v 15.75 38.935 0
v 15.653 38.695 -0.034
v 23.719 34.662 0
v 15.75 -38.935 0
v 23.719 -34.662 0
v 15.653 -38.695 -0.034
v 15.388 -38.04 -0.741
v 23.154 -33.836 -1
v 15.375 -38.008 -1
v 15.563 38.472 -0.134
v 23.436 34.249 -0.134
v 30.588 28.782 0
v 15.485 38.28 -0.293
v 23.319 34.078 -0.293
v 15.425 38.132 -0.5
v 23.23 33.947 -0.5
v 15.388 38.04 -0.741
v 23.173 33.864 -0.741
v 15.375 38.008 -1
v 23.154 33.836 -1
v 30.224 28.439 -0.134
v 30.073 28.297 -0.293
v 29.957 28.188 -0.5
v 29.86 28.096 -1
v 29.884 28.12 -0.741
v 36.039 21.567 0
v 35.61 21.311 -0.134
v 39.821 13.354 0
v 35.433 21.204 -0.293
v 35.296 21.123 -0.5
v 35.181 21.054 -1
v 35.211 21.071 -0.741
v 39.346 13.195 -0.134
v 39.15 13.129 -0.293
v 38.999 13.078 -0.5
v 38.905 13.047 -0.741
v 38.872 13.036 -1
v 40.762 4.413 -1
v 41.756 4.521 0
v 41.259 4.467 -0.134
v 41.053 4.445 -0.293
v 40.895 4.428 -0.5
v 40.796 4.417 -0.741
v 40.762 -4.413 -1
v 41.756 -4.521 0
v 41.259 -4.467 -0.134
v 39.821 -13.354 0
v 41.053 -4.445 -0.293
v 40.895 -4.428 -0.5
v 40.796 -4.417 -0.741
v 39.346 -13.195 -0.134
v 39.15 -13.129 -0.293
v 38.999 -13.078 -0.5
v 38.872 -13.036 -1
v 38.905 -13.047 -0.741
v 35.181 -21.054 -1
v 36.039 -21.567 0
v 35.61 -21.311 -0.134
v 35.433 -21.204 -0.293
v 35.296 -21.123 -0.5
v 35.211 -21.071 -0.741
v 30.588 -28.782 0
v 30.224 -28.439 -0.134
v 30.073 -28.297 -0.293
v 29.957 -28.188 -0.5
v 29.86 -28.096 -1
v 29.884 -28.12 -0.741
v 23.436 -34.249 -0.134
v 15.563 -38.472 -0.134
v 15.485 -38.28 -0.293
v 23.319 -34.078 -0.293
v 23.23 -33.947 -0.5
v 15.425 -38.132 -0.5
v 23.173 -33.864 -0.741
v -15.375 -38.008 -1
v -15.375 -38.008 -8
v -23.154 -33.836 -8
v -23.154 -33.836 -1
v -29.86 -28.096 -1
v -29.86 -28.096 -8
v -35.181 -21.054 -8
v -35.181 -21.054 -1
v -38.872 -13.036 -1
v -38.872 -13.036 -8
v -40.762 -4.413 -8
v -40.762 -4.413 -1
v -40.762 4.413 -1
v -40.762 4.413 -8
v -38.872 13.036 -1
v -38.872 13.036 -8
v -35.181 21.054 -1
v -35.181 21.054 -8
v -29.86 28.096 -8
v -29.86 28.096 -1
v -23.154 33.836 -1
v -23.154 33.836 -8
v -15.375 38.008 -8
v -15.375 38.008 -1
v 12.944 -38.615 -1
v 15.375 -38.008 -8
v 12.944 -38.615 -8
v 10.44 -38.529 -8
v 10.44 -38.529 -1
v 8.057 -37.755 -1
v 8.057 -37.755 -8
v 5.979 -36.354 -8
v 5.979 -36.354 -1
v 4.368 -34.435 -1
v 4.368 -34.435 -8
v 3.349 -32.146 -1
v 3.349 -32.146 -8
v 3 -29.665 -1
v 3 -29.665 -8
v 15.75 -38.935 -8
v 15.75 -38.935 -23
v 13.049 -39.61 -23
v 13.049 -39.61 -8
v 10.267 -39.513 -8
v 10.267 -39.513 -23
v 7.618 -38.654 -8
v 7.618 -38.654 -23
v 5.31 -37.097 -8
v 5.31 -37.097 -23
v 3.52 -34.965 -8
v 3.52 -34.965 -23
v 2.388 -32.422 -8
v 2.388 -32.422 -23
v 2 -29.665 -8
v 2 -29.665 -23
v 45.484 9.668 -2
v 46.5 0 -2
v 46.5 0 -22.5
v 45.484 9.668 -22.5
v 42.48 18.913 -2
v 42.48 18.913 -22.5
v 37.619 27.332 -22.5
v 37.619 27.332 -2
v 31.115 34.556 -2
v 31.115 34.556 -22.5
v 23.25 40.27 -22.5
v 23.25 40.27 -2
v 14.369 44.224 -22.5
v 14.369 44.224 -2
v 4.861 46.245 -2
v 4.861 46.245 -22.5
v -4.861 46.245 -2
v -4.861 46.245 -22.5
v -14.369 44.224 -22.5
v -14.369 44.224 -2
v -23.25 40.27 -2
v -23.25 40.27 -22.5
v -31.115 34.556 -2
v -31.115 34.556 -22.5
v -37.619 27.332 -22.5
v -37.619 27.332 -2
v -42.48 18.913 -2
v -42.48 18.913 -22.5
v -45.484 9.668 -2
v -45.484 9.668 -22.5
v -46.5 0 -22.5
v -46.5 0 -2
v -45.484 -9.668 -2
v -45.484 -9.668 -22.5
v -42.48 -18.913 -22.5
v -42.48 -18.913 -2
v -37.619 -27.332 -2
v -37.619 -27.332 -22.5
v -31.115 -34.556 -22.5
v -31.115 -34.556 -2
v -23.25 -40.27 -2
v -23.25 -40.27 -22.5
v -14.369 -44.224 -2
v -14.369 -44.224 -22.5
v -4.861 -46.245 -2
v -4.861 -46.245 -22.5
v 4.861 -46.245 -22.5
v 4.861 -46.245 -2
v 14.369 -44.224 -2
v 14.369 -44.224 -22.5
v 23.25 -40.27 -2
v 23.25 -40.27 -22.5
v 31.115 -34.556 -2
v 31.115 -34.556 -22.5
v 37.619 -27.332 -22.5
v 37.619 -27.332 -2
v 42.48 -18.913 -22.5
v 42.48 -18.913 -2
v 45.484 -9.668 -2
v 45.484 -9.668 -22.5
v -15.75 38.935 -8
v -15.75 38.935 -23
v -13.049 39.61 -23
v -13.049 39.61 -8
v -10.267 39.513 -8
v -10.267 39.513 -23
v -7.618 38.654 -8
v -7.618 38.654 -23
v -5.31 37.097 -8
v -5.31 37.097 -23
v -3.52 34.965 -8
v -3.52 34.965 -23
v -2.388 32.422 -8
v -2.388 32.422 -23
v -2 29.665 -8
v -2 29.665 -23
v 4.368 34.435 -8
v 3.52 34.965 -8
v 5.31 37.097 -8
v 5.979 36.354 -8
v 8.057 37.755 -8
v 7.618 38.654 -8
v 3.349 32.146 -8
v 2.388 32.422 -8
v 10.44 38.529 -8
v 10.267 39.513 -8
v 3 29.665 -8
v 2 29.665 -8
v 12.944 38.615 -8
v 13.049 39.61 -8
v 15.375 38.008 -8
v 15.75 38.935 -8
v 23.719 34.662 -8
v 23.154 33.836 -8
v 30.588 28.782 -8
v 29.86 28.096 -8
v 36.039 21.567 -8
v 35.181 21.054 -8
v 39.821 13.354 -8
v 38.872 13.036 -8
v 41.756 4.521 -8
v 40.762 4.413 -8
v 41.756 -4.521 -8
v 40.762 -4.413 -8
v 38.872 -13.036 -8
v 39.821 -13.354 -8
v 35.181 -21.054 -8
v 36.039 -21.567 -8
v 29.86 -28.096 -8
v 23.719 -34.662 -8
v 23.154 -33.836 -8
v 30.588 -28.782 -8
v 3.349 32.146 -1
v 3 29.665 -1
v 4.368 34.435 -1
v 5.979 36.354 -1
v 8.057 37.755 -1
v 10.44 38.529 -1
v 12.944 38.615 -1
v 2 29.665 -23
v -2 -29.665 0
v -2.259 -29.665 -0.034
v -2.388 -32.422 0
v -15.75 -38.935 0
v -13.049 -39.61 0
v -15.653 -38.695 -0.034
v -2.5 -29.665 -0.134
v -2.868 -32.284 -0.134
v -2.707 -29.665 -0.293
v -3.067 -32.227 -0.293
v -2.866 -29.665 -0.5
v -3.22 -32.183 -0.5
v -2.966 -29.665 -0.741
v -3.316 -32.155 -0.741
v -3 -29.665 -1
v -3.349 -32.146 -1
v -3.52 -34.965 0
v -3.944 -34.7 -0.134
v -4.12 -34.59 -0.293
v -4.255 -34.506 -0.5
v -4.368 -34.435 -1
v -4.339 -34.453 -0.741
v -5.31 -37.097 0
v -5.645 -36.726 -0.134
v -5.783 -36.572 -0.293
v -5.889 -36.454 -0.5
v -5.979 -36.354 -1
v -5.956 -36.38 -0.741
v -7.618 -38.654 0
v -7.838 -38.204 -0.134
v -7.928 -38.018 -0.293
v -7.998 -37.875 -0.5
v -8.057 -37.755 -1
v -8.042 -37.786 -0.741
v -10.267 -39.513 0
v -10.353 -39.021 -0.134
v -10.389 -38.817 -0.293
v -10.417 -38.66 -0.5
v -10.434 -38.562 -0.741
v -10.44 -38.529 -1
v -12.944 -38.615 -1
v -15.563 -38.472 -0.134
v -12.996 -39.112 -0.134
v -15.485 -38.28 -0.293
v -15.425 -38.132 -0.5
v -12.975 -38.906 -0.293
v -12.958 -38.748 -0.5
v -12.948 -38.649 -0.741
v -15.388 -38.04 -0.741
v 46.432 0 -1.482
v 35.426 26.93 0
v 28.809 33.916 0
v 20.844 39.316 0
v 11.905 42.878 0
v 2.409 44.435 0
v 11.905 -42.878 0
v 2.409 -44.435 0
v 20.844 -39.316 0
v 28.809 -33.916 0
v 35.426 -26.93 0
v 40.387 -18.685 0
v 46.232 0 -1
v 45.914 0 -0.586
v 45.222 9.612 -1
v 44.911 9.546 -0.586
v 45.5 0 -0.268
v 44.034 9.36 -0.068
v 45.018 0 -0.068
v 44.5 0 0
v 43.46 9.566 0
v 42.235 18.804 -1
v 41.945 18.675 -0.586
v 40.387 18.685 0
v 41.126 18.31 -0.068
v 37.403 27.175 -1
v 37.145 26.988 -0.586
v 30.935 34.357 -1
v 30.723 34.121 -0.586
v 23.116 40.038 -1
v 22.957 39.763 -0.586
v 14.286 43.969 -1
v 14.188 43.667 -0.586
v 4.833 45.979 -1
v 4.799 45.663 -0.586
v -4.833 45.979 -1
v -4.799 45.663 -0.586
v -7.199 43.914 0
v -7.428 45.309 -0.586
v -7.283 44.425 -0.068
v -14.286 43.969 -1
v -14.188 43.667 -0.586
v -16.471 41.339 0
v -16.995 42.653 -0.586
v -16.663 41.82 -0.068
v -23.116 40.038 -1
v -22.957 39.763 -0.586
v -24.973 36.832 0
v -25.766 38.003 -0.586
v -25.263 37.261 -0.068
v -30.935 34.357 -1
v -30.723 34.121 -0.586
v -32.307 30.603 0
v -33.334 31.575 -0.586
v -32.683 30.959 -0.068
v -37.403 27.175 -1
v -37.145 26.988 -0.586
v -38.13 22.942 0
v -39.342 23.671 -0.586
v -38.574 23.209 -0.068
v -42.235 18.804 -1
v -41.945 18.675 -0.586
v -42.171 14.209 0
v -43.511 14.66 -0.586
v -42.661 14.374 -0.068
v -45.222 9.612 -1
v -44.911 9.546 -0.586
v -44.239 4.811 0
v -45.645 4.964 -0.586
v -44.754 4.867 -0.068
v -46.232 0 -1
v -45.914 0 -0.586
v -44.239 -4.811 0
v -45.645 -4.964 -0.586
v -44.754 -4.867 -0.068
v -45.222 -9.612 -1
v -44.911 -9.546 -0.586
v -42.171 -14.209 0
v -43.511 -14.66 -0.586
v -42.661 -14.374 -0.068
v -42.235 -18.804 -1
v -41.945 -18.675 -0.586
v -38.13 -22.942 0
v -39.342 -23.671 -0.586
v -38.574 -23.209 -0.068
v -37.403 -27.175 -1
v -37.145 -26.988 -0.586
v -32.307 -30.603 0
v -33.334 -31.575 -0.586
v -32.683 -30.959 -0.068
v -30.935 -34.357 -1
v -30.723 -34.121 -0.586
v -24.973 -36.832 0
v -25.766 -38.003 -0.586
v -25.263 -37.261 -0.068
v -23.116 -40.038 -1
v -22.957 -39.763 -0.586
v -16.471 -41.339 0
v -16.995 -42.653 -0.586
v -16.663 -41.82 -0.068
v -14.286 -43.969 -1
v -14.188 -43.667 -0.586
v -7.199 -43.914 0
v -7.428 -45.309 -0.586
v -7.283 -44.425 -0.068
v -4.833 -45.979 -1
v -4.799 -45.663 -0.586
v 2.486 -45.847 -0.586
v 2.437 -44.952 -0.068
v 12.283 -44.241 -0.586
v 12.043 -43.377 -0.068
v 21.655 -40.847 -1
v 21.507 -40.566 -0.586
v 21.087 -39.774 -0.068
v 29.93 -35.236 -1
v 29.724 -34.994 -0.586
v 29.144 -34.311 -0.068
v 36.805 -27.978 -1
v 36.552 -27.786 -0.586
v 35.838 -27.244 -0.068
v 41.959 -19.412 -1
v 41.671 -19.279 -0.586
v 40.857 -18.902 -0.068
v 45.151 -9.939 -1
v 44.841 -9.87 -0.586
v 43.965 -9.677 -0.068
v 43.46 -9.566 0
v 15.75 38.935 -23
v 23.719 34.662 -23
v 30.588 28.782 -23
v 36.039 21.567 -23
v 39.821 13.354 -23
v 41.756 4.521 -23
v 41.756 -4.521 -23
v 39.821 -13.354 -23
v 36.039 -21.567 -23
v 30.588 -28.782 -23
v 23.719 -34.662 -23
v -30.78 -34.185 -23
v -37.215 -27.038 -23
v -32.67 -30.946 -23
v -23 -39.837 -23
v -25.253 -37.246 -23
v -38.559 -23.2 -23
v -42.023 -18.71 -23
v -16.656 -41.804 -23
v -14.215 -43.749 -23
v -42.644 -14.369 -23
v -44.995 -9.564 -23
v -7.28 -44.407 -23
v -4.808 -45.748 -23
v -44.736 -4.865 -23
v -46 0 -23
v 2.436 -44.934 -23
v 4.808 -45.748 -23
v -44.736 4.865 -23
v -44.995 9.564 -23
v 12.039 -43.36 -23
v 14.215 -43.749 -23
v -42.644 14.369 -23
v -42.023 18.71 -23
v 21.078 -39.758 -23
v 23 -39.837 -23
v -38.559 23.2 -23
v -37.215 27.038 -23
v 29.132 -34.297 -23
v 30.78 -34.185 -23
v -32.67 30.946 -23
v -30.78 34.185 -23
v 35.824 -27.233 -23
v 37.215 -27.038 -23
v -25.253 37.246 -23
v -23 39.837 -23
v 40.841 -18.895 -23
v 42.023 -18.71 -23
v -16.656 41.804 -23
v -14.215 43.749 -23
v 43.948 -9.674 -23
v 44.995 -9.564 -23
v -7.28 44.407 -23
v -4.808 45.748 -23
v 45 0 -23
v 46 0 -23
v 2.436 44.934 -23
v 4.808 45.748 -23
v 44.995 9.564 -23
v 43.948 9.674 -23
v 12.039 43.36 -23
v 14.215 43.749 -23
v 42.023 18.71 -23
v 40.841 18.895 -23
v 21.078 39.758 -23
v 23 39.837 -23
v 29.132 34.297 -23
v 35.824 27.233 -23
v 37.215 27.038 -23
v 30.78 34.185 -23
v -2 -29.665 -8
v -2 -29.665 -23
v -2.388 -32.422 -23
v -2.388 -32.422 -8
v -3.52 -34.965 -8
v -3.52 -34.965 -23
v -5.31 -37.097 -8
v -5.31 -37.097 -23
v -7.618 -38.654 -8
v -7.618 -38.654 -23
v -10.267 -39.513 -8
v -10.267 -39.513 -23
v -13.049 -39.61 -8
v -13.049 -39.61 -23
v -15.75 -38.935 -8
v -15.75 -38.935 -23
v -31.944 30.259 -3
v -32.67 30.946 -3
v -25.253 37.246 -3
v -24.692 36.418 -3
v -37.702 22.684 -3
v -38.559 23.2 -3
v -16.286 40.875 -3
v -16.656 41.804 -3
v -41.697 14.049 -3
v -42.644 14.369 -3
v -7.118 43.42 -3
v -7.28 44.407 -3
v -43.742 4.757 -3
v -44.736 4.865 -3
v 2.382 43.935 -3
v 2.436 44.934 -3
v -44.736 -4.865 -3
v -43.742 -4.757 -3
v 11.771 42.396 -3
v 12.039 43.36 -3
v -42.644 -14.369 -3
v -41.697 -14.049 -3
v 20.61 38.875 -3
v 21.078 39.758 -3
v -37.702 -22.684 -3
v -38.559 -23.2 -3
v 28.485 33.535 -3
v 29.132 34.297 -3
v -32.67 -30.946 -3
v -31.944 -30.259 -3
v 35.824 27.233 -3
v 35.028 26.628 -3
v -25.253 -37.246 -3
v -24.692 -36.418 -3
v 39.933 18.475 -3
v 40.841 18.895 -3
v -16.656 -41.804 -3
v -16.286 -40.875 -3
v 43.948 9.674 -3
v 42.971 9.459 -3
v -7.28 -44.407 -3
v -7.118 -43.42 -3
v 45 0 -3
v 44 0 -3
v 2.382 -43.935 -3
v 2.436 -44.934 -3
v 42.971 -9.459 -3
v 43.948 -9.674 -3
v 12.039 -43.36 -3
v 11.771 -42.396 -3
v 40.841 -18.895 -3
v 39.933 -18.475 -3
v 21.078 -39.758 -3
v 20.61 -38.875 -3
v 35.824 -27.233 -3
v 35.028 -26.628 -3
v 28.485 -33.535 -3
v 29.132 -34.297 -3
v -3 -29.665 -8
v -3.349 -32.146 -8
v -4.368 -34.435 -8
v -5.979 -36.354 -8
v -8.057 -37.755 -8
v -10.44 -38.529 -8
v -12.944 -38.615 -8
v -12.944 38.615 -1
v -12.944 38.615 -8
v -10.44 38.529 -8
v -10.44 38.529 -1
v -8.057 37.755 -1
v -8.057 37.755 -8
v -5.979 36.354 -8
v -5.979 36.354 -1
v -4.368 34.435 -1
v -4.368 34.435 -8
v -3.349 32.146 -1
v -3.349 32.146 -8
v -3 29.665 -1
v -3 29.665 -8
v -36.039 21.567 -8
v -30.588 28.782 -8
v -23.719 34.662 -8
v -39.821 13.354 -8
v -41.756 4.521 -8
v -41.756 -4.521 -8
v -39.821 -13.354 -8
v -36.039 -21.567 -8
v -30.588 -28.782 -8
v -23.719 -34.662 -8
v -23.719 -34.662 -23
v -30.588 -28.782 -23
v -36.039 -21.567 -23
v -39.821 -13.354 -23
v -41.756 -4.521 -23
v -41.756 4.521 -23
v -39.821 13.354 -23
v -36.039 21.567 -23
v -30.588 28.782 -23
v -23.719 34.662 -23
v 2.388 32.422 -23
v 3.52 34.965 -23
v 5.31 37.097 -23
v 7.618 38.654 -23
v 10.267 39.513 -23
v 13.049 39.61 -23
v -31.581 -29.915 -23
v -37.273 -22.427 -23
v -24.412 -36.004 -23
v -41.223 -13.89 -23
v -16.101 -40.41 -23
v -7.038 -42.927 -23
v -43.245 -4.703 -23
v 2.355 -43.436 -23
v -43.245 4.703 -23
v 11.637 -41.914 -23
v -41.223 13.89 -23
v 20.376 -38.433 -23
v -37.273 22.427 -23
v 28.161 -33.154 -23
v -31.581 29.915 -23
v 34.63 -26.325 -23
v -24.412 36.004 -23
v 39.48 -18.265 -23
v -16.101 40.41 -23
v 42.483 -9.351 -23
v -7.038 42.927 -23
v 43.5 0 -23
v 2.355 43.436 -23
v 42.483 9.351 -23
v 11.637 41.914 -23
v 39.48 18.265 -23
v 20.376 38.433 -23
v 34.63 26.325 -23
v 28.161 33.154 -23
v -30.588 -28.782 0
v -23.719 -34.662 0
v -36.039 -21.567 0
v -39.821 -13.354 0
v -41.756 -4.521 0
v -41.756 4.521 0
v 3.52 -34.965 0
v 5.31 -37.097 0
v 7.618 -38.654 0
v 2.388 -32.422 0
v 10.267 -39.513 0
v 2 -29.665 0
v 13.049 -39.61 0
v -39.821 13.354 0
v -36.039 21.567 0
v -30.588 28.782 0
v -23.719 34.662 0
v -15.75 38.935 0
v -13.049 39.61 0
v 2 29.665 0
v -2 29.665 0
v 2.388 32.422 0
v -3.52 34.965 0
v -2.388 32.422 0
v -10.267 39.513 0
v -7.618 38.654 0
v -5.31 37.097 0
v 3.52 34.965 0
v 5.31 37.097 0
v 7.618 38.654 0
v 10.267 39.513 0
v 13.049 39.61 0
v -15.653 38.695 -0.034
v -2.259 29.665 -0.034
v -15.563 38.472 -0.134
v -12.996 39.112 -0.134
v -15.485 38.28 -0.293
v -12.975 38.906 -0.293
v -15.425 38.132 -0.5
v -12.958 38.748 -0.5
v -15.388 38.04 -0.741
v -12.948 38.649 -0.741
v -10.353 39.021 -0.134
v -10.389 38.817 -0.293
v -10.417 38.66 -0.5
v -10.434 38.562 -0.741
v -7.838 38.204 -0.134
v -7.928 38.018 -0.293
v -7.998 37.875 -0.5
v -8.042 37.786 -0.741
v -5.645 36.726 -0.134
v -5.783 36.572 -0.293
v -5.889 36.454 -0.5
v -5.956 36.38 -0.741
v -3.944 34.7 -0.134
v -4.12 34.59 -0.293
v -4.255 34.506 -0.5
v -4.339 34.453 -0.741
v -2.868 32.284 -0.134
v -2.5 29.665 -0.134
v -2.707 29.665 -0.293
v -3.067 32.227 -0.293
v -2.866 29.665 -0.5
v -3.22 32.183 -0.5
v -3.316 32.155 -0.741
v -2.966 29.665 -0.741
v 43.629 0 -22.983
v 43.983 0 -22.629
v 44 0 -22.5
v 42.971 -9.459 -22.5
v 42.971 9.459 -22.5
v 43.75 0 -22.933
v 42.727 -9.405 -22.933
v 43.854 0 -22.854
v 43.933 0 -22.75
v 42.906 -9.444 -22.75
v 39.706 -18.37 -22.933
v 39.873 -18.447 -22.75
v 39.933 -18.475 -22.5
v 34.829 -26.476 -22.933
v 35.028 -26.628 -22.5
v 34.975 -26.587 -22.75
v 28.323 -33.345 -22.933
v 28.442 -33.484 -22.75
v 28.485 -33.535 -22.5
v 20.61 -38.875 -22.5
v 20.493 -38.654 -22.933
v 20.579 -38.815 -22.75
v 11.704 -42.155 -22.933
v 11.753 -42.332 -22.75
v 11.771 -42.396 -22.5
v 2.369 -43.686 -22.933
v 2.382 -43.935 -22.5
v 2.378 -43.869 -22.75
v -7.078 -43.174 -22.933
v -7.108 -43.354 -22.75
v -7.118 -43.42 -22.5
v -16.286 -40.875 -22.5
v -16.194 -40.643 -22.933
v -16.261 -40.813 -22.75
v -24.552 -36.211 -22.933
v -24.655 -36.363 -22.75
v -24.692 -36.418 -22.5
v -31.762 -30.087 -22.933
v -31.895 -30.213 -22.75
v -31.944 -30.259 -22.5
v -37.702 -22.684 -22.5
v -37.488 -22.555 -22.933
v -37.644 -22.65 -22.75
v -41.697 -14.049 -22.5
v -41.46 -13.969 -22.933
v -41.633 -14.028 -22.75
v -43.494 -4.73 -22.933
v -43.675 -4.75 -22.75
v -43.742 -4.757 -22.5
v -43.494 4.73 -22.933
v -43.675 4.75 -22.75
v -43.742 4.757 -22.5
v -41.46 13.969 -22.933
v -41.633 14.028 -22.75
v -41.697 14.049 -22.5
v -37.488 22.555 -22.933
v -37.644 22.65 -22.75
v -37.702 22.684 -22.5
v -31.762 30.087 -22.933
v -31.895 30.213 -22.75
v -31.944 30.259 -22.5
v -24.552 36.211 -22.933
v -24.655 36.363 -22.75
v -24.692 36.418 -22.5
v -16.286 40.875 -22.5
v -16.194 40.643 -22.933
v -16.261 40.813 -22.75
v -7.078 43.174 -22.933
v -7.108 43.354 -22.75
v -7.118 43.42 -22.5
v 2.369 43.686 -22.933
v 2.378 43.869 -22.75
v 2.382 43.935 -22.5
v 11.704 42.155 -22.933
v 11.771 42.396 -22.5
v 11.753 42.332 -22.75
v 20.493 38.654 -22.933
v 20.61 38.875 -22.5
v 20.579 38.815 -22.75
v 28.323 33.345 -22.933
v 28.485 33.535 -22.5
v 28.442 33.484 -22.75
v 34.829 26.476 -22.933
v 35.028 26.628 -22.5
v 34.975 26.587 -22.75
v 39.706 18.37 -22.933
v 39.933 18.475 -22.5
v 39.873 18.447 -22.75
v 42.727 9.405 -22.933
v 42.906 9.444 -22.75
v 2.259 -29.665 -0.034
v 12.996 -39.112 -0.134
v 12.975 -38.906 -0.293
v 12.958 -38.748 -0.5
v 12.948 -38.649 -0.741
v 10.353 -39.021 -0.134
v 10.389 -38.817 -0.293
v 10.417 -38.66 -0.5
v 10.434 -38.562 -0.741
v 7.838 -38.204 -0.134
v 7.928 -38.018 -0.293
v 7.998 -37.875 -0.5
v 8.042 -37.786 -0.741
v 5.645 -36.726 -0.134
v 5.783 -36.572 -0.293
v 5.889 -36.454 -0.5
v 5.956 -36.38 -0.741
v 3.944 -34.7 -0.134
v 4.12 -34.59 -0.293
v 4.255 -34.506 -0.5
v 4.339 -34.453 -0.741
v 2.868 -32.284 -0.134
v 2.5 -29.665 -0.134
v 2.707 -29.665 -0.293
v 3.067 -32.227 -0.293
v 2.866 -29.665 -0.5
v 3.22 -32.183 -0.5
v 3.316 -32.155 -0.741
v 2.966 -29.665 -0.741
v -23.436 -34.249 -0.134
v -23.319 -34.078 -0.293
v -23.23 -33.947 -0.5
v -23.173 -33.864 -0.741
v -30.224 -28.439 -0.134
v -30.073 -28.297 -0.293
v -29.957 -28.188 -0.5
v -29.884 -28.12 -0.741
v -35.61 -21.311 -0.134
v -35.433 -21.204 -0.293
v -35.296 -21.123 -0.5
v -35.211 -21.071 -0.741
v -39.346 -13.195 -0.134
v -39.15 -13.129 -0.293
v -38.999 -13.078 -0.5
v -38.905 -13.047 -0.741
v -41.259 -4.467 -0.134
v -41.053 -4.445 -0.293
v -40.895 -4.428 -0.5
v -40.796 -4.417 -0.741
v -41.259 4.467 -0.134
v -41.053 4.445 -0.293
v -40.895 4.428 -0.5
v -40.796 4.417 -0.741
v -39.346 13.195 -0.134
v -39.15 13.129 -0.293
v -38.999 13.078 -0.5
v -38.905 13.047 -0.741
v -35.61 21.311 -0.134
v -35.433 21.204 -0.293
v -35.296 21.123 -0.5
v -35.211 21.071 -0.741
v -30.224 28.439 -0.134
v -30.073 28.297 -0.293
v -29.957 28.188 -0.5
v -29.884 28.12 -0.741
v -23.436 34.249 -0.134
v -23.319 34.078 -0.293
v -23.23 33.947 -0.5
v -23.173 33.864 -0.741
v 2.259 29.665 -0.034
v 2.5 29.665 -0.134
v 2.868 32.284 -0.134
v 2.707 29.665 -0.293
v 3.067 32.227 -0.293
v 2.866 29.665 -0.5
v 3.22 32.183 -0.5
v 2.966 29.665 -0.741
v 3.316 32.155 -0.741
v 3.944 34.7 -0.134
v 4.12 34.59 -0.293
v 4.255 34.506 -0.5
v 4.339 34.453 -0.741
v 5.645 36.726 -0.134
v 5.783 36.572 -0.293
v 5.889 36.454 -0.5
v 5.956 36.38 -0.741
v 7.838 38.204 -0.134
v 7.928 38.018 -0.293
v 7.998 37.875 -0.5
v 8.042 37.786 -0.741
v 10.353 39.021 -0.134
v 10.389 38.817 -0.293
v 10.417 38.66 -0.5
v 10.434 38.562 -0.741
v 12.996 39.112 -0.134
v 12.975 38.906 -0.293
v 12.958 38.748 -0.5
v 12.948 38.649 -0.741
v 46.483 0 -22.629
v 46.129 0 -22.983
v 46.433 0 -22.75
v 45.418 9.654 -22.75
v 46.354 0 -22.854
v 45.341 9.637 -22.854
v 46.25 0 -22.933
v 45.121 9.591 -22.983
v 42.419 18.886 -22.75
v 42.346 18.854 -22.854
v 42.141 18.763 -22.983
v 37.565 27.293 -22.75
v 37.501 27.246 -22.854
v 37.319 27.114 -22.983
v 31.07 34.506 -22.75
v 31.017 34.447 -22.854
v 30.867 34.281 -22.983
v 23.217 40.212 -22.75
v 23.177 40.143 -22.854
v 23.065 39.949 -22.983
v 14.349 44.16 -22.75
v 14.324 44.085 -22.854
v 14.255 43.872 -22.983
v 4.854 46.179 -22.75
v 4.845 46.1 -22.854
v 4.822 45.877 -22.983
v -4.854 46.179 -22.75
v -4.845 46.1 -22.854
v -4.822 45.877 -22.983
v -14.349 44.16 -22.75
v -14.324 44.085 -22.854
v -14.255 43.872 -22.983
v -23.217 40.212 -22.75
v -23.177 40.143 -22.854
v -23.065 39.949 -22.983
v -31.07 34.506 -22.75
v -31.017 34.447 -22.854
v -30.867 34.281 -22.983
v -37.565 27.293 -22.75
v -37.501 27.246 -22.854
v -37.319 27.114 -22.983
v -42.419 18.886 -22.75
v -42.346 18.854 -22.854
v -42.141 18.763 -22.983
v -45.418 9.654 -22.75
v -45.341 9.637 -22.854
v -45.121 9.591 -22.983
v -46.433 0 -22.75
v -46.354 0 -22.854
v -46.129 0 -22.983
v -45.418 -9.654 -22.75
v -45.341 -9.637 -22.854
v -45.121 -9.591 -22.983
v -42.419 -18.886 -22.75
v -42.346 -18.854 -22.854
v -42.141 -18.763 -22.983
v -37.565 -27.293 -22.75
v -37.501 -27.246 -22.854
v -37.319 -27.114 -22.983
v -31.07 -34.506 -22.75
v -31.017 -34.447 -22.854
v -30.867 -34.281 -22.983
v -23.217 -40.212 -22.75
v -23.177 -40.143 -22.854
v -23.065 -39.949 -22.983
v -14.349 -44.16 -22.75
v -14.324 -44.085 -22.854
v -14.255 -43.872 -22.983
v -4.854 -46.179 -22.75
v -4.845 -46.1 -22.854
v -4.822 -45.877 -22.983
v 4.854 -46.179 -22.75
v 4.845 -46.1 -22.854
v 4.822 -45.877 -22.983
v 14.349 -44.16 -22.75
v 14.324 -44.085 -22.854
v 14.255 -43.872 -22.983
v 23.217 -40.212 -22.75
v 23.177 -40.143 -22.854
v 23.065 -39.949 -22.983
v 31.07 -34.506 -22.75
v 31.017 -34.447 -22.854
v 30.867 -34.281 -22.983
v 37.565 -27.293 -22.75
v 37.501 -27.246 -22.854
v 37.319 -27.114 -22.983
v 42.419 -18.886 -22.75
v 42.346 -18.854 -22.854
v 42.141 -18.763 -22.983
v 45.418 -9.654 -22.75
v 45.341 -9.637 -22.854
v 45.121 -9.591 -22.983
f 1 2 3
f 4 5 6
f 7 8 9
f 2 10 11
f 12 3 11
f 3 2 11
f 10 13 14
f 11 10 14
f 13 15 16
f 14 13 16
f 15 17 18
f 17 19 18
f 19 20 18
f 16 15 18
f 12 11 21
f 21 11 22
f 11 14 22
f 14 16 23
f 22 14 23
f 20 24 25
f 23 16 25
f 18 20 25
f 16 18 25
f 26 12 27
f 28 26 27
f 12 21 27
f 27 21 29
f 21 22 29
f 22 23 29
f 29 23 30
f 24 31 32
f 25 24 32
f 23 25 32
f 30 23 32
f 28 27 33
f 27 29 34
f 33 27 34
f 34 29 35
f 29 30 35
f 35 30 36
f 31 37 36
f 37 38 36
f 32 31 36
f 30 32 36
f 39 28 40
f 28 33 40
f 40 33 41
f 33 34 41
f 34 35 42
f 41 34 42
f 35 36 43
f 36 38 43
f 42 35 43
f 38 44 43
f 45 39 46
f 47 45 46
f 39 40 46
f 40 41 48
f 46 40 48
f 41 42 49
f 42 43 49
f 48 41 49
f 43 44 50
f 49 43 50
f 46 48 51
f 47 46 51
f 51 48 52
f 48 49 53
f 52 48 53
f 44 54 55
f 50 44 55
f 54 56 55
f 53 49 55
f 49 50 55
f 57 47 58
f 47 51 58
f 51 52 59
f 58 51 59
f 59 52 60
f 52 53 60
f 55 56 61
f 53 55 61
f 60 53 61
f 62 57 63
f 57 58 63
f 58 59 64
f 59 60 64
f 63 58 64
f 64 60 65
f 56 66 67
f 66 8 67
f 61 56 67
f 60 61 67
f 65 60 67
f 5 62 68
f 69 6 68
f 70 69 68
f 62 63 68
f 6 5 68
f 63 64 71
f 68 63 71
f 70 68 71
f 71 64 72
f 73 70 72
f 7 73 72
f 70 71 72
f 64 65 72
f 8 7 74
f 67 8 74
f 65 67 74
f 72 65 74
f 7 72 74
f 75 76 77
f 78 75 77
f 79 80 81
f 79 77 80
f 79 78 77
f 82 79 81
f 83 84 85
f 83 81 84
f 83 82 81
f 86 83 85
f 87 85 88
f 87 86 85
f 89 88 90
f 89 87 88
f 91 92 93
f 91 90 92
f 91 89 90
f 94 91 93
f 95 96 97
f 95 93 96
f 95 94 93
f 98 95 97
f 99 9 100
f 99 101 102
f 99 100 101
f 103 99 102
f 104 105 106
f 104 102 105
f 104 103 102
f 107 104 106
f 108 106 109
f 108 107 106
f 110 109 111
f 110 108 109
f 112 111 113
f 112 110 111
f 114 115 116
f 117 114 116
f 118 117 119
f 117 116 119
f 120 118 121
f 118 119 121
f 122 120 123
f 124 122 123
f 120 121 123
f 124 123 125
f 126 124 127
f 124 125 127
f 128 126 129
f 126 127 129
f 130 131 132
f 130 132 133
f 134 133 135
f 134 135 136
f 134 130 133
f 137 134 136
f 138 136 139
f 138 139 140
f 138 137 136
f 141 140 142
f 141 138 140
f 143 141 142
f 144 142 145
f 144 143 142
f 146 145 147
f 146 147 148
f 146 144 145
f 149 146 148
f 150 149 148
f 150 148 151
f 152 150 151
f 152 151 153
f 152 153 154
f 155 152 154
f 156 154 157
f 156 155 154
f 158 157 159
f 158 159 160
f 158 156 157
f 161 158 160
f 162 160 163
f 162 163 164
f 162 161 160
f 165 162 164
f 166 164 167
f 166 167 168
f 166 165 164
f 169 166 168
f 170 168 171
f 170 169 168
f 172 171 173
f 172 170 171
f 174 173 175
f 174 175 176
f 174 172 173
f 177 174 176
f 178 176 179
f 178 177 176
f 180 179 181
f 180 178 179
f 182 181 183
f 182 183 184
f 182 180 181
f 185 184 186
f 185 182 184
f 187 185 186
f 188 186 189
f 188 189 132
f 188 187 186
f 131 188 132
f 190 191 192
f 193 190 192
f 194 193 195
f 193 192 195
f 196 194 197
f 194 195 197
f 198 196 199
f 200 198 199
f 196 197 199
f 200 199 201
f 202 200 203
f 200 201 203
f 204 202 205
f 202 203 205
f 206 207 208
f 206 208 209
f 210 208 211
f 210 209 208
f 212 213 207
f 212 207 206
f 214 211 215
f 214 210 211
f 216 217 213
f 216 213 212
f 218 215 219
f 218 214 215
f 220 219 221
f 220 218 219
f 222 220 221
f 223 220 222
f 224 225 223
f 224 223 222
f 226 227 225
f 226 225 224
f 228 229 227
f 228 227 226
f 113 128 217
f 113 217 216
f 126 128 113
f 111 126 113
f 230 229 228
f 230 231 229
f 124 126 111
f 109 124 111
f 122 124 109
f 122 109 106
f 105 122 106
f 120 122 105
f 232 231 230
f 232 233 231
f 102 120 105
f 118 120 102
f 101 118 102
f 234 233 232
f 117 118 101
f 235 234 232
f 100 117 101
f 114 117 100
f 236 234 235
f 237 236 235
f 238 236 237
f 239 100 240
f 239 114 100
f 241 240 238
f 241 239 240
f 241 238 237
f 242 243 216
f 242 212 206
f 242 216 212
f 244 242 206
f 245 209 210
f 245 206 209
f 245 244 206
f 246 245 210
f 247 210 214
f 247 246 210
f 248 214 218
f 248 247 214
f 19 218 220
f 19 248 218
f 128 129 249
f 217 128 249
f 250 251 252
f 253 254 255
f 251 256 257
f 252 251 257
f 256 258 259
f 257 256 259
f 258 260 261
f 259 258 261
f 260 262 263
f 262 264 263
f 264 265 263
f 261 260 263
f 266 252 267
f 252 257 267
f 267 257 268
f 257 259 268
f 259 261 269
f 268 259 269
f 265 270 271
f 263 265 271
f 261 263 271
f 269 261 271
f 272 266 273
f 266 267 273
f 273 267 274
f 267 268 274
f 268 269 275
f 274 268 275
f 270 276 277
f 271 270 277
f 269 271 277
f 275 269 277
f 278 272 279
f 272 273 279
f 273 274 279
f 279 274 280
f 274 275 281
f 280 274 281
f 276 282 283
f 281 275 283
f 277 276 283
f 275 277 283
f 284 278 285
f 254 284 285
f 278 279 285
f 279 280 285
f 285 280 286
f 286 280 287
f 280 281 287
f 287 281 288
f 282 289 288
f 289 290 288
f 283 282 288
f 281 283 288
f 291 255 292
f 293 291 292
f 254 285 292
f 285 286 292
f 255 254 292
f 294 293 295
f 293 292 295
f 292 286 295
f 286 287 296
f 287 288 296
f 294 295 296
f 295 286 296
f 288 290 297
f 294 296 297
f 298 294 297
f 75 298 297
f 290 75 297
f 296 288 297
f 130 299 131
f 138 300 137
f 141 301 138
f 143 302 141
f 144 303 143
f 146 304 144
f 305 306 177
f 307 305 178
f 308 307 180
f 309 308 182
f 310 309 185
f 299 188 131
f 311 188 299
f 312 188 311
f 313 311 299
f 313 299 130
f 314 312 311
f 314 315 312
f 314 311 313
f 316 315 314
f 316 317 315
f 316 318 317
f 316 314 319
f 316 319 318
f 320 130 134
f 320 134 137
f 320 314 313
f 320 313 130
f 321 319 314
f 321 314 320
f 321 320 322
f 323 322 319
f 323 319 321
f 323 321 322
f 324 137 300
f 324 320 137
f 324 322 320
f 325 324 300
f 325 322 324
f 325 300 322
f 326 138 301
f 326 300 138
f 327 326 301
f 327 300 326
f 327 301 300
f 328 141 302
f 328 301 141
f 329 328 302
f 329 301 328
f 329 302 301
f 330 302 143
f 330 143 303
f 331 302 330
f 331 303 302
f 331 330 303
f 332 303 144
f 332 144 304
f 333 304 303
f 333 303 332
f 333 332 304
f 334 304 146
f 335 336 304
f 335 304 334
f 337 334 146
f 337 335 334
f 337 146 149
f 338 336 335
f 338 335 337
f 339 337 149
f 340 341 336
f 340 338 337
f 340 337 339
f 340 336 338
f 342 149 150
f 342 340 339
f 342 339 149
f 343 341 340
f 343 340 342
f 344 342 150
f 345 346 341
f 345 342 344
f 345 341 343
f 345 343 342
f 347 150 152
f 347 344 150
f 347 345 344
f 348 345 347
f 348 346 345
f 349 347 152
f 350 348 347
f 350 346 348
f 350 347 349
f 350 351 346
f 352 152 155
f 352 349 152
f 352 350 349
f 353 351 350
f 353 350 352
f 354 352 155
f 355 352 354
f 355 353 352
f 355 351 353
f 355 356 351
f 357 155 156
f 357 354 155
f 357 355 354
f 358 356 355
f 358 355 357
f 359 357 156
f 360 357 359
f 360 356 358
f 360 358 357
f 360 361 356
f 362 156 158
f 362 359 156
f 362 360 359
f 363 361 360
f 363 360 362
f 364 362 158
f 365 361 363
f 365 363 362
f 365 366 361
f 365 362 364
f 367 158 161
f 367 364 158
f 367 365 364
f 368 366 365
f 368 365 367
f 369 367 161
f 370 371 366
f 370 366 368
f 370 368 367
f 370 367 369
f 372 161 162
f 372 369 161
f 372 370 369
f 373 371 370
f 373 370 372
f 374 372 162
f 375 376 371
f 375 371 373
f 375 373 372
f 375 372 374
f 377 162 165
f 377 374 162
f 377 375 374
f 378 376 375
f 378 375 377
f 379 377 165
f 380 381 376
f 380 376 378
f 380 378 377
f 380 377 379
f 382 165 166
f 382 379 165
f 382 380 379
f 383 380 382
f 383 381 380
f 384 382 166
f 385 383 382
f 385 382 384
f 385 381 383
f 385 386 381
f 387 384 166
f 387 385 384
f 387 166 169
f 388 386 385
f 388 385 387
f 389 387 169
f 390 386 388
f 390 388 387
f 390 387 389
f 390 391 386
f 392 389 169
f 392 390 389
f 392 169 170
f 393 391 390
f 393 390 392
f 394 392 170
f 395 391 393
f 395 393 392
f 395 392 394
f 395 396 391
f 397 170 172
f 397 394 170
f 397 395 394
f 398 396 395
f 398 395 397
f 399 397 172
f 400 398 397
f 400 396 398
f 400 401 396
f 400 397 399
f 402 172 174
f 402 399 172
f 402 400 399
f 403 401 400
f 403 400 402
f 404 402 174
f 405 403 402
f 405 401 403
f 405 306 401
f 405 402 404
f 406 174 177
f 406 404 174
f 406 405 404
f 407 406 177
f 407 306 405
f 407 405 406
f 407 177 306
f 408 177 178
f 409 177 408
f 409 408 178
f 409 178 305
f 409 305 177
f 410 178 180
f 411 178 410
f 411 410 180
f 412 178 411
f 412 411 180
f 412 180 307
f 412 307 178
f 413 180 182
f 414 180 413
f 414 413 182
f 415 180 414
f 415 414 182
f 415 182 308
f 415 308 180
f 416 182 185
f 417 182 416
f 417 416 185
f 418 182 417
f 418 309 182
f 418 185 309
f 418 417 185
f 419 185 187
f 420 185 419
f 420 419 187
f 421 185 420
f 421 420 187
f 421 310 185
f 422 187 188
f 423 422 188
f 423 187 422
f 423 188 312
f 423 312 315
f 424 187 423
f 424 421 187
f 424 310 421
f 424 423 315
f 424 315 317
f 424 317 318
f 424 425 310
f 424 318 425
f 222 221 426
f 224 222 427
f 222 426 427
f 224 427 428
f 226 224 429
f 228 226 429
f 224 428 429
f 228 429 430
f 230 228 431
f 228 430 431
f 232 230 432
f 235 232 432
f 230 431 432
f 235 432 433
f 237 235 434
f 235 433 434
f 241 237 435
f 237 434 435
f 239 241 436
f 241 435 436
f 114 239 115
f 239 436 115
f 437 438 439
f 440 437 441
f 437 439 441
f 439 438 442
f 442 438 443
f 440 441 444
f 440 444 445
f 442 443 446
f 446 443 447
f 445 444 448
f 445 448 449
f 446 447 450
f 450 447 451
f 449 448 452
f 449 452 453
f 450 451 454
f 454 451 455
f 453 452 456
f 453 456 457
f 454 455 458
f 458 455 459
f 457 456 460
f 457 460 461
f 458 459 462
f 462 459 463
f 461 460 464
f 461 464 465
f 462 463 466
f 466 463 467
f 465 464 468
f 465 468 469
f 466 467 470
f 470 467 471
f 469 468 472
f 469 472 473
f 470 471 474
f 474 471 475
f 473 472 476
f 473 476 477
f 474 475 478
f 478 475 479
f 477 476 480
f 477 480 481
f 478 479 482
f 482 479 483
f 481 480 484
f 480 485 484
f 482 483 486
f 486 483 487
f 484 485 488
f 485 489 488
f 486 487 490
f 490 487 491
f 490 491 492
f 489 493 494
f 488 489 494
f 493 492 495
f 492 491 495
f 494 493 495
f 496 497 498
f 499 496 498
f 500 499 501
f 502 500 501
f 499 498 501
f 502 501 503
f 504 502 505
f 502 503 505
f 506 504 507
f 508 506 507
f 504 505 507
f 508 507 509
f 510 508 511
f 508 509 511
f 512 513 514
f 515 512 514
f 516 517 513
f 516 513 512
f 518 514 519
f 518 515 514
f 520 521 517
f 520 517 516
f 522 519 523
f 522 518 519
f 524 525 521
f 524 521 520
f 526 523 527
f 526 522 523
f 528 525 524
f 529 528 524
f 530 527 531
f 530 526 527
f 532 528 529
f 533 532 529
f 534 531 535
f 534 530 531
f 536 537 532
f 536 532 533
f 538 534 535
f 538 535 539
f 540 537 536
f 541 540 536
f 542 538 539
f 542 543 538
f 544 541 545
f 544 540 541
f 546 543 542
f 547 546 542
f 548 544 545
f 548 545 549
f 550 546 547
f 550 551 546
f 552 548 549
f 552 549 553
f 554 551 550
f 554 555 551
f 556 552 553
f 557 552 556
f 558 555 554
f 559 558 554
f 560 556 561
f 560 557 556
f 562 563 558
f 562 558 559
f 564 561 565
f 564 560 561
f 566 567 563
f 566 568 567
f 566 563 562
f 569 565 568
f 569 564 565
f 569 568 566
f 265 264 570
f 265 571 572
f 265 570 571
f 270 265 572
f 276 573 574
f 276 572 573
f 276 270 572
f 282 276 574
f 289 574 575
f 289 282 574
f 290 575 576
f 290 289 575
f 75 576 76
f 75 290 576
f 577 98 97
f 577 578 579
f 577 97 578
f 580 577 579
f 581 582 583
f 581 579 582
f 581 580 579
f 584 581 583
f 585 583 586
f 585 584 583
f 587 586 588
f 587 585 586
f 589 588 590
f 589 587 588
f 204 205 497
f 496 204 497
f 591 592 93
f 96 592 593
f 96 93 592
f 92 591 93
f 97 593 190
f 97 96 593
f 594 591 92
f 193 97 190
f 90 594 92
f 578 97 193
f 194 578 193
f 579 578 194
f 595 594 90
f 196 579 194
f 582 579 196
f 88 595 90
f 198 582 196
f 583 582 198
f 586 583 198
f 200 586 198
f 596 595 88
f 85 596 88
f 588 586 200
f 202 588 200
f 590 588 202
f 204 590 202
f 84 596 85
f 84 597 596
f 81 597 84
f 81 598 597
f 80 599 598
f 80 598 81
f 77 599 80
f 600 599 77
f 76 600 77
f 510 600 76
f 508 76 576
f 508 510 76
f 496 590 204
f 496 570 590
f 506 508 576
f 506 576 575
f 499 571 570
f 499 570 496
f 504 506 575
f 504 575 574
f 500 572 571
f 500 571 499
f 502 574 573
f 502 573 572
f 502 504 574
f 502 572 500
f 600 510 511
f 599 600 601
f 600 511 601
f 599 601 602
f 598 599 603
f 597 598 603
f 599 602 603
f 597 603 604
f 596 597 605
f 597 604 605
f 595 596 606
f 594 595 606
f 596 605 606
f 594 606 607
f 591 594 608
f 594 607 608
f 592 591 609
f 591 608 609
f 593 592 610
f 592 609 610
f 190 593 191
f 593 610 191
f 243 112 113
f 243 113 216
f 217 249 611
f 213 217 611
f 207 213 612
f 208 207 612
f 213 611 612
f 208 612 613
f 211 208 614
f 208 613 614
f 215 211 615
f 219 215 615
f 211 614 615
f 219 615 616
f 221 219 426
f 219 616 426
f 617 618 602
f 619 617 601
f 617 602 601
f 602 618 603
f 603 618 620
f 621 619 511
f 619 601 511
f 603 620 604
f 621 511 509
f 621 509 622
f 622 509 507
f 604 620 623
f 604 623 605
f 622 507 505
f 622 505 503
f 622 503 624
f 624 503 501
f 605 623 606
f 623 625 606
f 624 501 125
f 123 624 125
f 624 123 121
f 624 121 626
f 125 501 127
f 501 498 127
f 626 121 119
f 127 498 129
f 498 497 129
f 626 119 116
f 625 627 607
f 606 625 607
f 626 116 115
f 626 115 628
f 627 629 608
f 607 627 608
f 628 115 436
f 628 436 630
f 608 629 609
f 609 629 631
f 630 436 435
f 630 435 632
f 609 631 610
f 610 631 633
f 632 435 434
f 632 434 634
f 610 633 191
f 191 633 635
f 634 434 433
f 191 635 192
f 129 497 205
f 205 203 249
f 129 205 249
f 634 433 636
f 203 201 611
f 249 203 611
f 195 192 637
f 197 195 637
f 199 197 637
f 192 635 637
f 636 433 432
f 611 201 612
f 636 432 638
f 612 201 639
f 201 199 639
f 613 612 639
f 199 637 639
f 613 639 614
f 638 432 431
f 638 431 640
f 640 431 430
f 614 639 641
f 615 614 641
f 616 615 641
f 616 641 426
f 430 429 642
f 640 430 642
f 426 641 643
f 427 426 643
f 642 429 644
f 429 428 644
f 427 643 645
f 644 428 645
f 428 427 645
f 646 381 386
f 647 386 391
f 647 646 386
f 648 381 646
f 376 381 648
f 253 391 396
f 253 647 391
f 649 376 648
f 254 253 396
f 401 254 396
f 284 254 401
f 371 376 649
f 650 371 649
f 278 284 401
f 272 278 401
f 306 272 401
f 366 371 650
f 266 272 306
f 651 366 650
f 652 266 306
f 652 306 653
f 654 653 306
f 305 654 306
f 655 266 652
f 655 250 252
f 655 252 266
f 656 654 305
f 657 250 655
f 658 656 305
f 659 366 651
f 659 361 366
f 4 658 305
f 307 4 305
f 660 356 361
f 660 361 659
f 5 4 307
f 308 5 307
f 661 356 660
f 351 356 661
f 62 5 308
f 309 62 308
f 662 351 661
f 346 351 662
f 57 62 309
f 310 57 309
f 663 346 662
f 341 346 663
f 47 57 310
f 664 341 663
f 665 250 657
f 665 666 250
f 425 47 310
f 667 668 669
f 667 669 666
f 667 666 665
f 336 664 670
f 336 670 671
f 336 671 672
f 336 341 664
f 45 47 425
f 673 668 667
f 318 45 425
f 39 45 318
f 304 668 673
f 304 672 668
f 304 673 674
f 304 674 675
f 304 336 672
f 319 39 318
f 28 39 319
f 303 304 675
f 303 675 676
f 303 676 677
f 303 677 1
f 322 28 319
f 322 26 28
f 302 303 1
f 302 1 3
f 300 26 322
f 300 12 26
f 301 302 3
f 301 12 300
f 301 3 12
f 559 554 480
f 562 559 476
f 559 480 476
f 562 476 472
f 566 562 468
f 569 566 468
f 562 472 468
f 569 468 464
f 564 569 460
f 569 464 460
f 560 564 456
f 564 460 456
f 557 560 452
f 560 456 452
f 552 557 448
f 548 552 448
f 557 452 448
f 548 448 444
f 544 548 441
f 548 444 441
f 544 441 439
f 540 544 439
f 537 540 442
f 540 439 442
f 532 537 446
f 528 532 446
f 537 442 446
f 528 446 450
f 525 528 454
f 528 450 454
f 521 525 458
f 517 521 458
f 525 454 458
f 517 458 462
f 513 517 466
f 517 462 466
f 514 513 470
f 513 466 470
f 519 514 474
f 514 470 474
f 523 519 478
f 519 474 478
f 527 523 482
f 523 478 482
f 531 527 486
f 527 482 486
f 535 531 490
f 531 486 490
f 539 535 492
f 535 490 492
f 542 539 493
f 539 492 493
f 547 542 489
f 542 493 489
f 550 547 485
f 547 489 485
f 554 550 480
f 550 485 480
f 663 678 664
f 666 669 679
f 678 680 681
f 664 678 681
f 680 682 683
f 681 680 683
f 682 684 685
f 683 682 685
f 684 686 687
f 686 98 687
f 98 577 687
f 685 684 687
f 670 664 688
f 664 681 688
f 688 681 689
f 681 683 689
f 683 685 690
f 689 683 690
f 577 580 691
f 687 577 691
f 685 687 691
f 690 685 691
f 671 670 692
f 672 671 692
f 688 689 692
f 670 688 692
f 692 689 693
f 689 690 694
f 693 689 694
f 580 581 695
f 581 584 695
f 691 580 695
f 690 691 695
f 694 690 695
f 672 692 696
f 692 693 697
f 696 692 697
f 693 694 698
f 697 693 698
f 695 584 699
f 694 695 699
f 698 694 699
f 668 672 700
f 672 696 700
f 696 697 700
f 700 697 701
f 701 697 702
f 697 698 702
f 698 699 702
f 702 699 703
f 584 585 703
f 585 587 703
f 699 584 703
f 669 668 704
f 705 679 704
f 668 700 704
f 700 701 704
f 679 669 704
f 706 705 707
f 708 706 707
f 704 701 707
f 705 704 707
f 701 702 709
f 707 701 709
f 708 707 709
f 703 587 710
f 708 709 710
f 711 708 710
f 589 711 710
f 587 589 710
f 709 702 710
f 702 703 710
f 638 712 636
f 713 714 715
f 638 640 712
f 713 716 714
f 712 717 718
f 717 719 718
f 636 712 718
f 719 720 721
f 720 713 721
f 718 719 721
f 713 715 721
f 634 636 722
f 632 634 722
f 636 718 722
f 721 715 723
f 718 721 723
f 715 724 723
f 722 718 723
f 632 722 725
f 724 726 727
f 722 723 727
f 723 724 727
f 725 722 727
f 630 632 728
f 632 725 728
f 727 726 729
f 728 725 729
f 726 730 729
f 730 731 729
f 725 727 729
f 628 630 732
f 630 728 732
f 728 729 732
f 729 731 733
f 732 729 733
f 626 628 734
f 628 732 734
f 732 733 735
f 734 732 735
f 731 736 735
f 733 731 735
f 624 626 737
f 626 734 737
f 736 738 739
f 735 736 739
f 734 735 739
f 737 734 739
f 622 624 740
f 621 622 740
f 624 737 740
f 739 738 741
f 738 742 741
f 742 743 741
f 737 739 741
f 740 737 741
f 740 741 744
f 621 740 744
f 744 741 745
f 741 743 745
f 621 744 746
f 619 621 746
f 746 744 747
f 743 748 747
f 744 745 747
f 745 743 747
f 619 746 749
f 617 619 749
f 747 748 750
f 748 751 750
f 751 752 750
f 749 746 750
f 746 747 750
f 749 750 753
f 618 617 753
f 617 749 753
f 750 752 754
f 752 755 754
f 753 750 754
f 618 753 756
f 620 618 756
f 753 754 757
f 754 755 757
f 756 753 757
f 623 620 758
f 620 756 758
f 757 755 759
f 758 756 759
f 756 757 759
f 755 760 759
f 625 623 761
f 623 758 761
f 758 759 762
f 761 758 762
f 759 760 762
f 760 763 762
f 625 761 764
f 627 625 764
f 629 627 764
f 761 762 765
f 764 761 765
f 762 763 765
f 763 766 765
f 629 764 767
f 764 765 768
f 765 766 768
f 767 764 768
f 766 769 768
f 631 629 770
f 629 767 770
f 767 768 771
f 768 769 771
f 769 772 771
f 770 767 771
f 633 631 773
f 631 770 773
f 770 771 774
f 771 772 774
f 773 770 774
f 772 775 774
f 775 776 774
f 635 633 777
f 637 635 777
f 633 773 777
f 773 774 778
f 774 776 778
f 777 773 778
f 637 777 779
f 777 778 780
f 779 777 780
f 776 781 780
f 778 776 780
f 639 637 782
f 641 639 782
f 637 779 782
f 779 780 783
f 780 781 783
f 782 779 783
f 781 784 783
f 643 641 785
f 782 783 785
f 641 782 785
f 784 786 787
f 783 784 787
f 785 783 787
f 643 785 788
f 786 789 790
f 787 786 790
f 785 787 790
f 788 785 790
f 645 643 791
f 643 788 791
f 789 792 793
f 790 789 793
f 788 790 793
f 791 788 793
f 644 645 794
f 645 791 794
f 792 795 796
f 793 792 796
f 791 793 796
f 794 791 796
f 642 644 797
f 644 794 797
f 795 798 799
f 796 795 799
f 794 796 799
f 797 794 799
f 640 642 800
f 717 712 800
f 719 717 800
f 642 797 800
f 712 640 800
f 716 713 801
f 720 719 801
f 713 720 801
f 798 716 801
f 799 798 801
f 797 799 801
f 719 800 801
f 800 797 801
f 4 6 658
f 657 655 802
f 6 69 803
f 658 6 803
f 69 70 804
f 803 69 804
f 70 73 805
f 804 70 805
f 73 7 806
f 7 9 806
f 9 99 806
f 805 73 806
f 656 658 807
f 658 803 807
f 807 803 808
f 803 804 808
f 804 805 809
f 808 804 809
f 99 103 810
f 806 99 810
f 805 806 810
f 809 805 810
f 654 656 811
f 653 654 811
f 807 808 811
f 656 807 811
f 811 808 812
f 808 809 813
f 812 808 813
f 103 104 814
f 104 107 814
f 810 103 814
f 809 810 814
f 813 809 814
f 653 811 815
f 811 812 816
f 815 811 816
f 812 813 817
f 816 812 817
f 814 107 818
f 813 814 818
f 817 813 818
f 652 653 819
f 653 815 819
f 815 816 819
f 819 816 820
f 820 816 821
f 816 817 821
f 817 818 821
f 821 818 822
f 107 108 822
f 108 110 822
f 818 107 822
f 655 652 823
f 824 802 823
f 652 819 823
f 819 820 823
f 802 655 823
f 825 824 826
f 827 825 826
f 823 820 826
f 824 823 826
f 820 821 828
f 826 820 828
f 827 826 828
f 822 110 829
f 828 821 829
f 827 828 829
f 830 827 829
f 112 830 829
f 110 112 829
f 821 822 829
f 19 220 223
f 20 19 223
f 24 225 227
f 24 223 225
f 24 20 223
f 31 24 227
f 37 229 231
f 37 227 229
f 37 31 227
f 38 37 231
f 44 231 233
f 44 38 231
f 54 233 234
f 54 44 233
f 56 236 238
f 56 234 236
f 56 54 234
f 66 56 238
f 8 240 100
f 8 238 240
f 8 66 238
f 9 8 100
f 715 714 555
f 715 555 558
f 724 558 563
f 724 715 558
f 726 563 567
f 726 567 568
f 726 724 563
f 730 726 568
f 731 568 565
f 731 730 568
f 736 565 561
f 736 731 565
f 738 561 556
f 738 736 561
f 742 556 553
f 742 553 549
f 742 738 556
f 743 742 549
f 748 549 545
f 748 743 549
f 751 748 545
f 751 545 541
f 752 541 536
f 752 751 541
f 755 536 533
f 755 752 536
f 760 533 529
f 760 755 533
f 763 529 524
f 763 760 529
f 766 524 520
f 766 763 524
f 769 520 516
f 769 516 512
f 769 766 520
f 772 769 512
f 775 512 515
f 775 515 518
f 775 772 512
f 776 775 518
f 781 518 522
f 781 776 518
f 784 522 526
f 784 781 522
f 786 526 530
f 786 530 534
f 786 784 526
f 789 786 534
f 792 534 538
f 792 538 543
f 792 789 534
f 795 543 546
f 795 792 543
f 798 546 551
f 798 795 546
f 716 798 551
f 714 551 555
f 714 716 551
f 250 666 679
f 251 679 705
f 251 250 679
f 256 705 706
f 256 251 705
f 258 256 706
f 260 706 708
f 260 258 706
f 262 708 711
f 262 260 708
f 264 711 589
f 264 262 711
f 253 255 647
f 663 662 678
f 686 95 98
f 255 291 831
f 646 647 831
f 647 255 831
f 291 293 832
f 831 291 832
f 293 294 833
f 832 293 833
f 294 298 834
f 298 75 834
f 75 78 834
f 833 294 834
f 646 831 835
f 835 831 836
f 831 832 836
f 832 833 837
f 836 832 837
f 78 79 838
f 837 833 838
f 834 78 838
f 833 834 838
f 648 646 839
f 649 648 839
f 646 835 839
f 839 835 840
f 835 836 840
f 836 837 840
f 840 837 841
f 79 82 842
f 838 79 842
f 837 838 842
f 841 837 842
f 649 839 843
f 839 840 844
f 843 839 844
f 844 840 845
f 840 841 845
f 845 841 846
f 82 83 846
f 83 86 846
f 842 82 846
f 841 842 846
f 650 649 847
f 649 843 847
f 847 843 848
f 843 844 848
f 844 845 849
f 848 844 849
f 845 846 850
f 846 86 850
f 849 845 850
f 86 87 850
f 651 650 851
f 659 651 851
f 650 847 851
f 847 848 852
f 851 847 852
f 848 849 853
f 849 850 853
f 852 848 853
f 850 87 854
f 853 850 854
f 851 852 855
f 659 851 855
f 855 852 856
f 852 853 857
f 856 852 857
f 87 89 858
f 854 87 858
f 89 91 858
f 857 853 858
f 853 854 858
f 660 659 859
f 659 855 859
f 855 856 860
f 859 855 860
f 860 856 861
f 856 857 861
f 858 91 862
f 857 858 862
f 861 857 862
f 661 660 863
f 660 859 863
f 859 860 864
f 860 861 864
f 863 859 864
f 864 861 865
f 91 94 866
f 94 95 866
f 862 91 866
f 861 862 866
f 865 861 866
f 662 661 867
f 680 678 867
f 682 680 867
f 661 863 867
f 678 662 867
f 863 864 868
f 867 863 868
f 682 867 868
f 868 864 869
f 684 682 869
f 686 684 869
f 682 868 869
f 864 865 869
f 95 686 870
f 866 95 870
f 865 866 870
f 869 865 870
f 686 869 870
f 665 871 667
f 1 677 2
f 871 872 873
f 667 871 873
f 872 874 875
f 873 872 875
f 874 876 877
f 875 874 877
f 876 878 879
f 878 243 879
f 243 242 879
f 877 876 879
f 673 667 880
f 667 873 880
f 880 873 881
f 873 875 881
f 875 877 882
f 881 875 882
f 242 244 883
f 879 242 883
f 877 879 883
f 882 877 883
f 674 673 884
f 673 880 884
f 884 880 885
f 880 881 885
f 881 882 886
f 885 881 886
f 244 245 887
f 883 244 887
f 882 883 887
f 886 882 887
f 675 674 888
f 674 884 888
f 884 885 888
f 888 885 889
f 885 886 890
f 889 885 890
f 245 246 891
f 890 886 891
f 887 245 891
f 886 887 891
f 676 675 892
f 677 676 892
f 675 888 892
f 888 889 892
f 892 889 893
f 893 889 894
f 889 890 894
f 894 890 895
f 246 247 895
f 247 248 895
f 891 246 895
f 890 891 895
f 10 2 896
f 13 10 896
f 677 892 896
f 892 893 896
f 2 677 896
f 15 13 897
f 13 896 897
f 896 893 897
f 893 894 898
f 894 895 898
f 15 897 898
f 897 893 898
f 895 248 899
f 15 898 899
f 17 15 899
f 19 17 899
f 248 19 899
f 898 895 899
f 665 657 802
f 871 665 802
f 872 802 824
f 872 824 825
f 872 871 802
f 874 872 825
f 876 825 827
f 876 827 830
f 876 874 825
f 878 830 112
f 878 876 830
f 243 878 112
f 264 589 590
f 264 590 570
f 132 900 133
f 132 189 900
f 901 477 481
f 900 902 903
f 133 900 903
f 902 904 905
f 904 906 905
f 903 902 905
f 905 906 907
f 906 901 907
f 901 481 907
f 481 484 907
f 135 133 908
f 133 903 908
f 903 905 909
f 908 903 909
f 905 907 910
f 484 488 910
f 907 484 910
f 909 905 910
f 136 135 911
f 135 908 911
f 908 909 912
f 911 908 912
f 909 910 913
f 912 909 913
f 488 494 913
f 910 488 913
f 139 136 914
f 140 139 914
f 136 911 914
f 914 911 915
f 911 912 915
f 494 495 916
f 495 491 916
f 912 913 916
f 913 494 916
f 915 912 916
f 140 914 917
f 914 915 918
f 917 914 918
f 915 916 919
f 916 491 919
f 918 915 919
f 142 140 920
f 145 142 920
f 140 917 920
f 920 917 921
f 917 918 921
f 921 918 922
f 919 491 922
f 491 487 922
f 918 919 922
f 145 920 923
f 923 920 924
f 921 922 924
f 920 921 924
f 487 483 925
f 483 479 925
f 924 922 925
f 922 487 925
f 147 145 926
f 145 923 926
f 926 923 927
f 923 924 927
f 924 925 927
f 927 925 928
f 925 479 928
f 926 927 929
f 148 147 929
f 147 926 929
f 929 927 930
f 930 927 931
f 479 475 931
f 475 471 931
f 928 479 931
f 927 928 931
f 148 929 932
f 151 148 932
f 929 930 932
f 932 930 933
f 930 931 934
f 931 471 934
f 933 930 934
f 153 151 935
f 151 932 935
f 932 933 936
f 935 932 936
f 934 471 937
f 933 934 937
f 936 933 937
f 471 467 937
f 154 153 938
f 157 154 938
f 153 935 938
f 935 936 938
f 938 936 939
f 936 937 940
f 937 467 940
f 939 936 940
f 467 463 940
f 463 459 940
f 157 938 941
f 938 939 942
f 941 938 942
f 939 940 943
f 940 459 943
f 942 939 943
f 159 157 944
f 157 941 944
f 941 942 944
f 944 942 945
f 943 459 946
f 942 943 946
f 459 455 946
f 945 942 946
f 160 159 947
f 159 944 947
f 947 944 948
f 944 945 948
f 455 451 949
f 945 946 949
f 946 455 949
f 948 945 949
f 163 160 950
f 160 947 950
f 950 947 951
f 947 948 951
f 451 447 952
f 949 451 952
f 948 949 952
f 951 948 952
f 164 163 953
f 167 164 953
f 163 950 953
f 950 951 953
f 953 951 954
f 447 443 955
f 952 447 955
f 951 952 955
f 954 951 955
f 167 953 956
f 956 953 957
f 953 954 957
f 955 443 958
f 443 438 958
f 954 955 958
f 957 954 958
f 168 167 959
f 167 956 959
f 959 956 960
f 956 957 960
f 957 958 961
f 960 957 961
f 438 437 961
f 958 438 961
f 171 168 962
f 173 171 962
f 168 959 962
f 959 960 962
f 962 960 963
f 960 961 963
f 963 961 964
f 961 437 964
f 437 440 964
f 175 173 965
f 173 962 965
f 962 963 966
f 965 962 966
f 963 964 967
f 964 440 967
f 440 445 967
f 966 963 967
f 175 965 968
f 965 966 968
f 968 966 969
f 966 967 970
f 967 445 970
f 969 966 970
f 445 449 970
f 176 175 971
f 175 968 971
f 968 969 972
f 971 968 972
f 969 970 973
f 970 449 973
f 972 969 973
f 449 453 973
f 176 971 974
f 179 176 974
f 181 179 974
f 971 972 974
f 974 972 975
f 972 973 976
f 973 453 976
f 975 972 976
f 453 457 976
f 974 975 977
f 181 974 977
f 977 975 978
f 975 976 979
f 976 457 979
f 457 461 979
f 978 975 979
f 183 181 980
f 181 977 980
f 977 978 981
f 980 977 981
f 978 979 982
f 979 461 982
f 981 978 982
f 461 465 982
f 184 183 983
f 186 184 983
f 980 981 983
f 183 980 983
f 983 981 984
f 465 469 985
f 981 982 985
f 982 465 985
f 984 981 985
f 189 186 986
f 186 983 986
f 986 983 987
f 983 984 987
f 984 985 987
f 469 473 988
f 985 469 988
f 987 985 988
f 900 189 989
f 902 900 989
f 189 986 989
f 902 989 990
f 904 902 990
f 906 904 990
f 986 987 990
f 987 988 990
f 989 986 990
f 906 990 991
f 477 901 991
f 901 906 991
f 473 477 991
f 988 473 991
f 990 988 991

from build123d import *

# Parameters (mm, degrees)
F0_R     = 46.5
F1_DEPTH = 23
F3_DEPTH = 15
F4_R     = 1
F5_R     = 45
F5_R_2   = 44
F6_DEPTH = 20
F7_R     = 0.5
F8_R     = 2


# Not quite as in the source:
# - a feature names something its author has since deleted; it is built from what else it names


with BuildPart() as f1:
    # F0 (on Top) → F1 (new body)
    with BuildSketch(Plane.XY):
        Circle(F0_R)
        with BuildLine():
            ThreePointArc((-15.375, -38.0080172464), (-41, 0), (-15.375, 38.0080172464))
            ThreePointArc((-15.375, 38.0080172464), (-6.9688470506, 37.1271997267), (-3, 29.6647939484))
            Line((-3, 29.6647939484), (-3, -29.6647939484))
            ThreePointArc((-3, -29.6647939484), (-6.9688470506, -37.1271997267), (-15.375, -38.0080172464))
        make_face(mode=Mode.SUBTRACT)
        with BuildLine():
            Line((3, -29.6647939484), (3, 29.6647939484))
            ThreePointArc((3, 29.6647939484), (6.9688470506, 37.1271997267), (15.375, 38.0080172464))
            ThreePointArc((15.375, 38.0080172464), (41, 0), (15.375, -38.0080172464))
            ThreePointArc((15.375, -38.0080172464), (6.9688470506, -37.1271997267), (3, -29.6647939484))
        make_face(mode=Mode.SUBTRACT)
    extrude(amount=-F1_DEPTH)

    # F2 (on face) → F3 (cut)
    with BuildSketch(Plane(origin=(0, 0, -23), x_dir=(1, 0, 0), z_dir=(0, 0, -1))):
        with BuildLine():
            ThreePointArc((-15.75, -38.9350420573), (-6.4098300563, -37.9563559243), (-2, -29.6647939484))
            Line((-2, -29.6647939484), (-2, 29.6647939484))
            ThreePointArc((-2, 29.6647939484), (-6.4098300563, 37.9563559243), (-15.75, 38.9350420573))
            ThreePointArc((-15.75, 38.9350420573), (-42, 0), (-15.75, -38.9350420573))
        make_face()
        with BuildLine():
            Line((-3, 29.6647939484), (-3, -29.6647939484))
            ThreePointArc((-3, -29.6647939484), (-6.9688470506, -37.1271997267), (-15.375, -38.0080172464))
            ThreePointArc((-15.375, -38.0080172464), (-41, 0), (-15.375, 38.0080172464))
            ThreePointArc((-15.375, 38.0080172464), (-6.9688470506, 37.1271997267), (-3, 29.6647939484))
        make_face(mode=Mode.SUBTRACT)
        with BuildLine():
            ThreePointArc((2, -29.6647939484), (6.4098300563, -37.9563559243), (15.75, -38.9350420573))
            ThreePointArc((15.75, -38.9350420573), (42, 0), (15.75, 38.9350420573))
            ThreePointArc((15.75, 38.9350420573), (6.4098300563, 37.9563559243), (2, 29.6647939484))
            Line((2, 29.6647939484), (2, -29.6647939484))
        make_face()
        with BuildLine():
            ThreePointArc((3, 29.6647939484), (6.9688470506, 37.1271997267), (15.375, 38.0080172464))
            ThreePointArc((15.375, 38.0080172464), (41, 0), (15.375, -38.0080172464))
            ThreePointArc((15.375, -38.0080172464), (6.9688470506, -37.1271997267), (3, -29.6647939484))
            Line((3, -29.6647939484), (3, 29.6647939484))
        make_face(mode=Mode.SUBTRACT)
    extrude(amount=-F3_DEPTH, mode=Mode.SUBTRACT)

    # F4
    f4_edges = [f1.edges().sort_by_distance(p)[0] for p in [
        (-41, 0, 0),
        (3, 0, 0),
    ]]
    fillet(f4_edges, radius=F4_R)

    # F5 (on face) → F6 (cut)
    with BuildSketch(Plane(origin=(0, 0, -23), x_dir=(1, 0, 0), z_dir=(0, 0, -1))):
        Circle(F5_R)
        Circle(F5_R_2, mode=Mode.SUBTRACT)
    extrude(amount=-F6_DEPTH, mode=Mode.SUBTRACT)

    # F7
    f7_edges = [f1.edges().sort_by_distance(p)[0] for p in [
        (-44, 0, -23),
        (-46.5, 0, -23),
    ]]
    fillet(f7_edges, radius=F7_R)

    # F8
    f8_edges = [f1.edges().sort_by_distance(p)[0] for p in [
        (-46.5, 0, 0),
    ]]
    fillet(f8_edges, radius=F8_R)


solid = f1.part
